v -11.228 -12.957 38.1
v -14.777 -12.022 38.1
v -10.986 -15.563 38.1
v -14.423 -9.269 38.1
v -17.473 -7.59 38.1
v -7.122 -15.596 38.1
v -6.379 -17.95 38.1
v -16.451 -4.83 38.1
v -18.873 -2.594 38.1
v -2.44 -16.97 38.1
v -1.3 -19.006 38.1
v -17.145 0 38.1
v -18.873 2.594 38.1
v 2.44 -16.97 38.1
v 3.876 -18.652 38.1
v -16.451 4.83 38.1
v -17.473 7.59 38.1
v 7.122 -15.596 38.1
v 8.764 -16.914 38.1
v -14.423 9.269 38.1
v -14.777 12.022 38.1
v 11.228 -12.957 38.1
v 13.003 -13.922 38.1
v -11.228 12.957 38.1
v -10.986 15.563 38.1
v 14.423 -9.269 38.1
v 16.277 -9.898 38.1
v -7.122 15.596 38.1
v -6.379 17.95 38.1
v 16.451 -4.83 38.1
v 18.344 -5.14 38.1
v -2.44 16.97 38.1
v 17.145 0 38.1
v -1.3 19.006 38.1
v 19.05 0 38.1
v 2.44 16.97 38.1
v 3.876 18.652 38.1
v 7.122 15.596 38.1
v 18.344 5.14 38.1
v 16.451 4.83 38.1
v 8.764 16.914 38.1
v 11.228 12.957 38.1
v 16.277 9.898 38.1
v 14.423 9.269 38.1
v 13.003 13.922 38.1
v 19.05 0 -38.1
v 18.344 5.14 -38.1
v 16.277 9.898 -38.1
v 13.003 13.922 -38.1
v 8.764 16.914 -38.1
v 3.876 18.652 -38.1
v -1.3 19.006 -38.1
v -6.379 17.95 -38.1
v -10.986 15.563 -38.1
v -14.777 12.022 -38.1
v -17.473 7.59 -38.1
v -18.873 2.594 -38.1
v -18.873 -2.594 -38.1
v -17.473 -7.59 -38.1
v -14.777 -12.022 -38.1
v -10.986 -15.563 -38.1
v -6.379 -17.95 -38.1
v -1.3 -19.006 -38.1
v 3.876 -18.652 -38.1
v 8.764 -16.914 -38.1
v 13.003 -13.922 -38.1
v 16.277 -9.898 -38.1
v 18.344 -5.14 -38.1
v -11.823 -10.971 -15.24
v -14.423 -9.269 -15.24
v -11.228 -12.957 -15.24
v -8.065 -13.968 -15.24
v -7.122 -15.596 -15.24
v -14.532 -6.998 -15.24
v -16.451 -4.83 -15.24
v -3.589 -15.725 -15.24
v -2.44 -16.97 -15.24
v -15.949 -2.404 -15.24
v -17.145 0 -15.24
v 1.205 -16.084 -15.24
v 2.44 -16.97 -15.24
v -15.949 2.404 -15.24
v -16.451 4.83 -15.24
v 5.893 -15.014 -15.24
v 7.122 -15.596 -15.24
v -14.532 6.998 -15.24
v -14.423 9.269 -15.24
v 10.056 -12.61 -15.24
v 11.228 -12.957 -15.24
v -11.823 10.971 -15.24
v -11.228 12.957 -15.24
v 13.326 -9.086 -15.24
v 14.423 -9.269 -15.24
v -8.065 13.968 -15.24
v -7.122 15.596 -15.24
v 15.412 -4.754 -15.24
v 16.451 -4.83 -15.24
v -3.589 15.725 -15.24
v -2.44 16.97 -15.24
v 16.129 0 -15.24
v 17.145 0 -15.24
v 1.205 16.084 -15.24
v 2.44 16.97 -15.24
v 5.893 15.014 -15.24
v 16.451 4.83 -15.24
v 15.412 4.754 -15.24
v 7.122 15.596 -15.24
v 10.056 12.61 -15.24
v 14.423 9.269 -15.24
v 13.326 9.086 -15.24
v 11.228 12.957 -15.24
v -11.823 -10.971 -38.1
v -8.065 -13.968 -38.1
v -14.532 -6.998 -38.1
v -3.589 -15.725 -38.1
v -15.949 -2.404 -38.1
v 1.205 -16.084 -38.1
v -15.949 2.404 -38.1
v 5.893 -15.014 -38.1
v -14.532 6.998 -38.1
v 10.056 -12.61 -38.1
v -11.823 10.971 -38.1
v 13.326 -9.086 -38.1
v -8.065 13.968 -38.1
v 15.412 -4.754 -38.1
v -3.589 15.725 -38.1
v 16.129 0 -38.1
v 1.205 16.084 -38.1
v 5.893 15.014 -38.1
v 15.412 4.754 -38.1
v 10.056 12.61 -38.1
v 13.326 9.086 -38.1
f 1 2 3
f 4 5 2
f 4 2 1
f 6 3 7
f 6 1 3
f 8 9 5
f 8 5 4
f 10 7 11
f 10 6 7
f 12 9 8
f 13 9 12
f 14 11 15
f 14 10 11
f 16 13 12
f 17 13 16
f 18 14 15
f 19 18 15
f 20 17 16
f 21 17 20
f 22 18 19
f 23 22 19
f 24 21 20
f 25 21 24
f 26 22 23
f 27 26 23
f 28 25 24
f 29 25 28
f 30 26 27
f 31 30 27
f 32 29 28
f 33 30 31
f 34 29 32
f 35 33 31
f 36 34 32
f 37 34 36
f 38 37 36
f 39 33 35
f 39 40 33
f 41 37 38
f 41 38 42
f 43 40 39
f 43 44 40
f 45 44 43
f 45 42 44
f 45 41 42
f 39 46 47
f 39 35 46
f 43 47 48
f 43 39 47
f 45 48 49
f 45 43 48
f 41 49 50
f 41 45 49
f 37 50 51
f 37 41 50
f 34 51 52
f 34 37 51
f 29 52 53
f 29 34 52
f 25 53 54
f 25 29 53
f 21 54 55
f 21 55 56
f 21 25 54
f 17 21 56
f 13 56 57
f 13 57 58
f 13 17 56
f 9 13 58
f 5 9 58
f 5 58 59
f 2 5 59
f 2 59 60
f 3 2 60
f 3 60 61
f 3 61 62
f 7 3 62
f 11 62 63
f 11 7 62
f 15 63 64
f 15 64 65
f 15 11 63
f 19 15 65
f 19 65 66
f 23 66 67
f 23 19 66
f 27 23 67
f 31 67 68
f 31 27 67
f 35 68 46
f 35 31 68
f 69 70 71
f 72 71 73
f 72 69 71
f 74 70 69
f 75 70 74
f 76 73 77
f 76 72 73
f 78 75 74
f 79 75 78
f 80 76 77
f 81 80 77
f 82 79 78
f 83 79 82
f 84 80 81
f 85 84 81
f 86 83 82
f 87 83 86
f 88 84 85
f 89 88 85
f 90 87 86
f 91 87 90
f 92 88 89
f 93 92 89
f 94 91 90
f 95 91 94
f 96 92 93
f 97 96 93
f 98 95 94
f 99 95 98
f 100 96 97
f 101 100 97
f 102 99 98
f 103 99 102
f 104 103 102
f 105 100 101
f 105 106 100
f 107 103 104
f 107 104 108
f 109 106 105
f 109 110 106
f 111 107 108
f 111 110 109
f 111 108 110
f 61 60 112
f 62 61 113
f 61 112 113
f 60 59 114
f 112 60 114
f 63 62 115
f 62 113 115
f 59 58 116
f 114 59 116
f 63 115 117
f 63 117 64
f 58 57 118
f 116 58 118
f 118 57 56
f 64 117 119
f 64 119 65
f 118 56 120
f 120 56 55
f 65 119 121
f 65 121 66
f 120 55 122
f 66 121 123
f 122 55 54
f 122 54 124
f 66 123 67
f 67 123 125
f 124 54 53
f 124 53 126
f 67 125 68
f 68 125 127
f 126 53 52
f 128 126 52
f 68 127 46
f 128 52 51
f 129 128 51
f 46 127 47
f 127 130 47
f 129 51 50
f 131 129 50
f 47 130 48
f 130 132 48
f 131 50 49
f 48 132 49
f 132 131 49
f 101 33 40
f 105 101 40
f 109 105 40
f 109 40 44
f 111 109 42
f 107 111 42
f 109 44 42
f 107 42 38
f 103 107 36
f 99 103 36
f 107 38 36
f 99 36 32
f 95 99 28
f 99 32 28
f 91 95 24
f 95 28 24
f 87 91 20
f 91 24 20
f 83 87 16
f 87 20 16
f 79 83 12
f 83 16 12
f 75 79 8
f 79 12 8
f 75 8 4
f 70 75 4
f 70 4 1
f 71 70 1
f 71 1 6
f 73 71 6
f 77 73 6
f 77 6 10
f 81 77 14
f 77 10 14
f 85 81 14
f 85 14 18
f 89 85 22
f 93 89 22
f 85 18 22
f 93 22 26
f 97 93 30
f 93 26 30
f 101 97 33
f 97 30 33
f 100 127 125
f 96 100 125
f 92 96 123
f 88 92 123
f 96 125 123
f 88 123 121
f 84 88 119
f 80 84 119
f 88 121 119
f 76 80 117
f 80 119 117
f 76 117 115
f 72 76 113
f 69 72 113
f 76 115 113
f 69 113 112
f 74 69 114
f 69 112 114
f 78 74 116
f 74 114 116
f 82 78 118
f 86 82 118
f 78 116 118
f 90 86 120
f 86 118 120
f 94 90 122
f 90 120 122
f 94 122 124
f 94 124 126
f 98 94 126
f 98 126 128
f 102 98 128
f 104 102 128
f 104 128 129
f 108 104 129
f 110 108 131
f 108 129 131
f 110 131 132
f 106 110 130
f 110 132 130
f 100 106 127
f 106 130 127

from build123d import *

# Parameters (mm, degrees)
F0_R     = 19.05
F1_DEPTH = 38.1
F3_R     = 16.129
F4_DEPTH = 22.86
F5_R     = 17.145
F6_DEPTH = 53.34


with BuildPart() as f1:
    # F0 (on Top) → F1 (new body, symmetric)
    with BuildSketch(Plane.XY):
        Circle(F0_R)
    extrude(amount=F1_DEPTH, both=True)

    # F3 (on face) → F4 (cut)
    with BuildSketch(Plane(origin=(0, 0, -38.1), x_dir=(1, 0, 0), z_dir=(0, 0, -1))):
        Circle(F3_R)
    extrude(amount=-F4_DEPTH, mode=Mode.SUBTRACT)

    # F5 (on face) → F6 (cut)
    with BuildSketch(Plane.XY.offset(38.1)):
        Circle(F5_R)
    extrude(amount=-F6_DEPTH, mode=Mode.SUBTRACT)


solid = f1.part
